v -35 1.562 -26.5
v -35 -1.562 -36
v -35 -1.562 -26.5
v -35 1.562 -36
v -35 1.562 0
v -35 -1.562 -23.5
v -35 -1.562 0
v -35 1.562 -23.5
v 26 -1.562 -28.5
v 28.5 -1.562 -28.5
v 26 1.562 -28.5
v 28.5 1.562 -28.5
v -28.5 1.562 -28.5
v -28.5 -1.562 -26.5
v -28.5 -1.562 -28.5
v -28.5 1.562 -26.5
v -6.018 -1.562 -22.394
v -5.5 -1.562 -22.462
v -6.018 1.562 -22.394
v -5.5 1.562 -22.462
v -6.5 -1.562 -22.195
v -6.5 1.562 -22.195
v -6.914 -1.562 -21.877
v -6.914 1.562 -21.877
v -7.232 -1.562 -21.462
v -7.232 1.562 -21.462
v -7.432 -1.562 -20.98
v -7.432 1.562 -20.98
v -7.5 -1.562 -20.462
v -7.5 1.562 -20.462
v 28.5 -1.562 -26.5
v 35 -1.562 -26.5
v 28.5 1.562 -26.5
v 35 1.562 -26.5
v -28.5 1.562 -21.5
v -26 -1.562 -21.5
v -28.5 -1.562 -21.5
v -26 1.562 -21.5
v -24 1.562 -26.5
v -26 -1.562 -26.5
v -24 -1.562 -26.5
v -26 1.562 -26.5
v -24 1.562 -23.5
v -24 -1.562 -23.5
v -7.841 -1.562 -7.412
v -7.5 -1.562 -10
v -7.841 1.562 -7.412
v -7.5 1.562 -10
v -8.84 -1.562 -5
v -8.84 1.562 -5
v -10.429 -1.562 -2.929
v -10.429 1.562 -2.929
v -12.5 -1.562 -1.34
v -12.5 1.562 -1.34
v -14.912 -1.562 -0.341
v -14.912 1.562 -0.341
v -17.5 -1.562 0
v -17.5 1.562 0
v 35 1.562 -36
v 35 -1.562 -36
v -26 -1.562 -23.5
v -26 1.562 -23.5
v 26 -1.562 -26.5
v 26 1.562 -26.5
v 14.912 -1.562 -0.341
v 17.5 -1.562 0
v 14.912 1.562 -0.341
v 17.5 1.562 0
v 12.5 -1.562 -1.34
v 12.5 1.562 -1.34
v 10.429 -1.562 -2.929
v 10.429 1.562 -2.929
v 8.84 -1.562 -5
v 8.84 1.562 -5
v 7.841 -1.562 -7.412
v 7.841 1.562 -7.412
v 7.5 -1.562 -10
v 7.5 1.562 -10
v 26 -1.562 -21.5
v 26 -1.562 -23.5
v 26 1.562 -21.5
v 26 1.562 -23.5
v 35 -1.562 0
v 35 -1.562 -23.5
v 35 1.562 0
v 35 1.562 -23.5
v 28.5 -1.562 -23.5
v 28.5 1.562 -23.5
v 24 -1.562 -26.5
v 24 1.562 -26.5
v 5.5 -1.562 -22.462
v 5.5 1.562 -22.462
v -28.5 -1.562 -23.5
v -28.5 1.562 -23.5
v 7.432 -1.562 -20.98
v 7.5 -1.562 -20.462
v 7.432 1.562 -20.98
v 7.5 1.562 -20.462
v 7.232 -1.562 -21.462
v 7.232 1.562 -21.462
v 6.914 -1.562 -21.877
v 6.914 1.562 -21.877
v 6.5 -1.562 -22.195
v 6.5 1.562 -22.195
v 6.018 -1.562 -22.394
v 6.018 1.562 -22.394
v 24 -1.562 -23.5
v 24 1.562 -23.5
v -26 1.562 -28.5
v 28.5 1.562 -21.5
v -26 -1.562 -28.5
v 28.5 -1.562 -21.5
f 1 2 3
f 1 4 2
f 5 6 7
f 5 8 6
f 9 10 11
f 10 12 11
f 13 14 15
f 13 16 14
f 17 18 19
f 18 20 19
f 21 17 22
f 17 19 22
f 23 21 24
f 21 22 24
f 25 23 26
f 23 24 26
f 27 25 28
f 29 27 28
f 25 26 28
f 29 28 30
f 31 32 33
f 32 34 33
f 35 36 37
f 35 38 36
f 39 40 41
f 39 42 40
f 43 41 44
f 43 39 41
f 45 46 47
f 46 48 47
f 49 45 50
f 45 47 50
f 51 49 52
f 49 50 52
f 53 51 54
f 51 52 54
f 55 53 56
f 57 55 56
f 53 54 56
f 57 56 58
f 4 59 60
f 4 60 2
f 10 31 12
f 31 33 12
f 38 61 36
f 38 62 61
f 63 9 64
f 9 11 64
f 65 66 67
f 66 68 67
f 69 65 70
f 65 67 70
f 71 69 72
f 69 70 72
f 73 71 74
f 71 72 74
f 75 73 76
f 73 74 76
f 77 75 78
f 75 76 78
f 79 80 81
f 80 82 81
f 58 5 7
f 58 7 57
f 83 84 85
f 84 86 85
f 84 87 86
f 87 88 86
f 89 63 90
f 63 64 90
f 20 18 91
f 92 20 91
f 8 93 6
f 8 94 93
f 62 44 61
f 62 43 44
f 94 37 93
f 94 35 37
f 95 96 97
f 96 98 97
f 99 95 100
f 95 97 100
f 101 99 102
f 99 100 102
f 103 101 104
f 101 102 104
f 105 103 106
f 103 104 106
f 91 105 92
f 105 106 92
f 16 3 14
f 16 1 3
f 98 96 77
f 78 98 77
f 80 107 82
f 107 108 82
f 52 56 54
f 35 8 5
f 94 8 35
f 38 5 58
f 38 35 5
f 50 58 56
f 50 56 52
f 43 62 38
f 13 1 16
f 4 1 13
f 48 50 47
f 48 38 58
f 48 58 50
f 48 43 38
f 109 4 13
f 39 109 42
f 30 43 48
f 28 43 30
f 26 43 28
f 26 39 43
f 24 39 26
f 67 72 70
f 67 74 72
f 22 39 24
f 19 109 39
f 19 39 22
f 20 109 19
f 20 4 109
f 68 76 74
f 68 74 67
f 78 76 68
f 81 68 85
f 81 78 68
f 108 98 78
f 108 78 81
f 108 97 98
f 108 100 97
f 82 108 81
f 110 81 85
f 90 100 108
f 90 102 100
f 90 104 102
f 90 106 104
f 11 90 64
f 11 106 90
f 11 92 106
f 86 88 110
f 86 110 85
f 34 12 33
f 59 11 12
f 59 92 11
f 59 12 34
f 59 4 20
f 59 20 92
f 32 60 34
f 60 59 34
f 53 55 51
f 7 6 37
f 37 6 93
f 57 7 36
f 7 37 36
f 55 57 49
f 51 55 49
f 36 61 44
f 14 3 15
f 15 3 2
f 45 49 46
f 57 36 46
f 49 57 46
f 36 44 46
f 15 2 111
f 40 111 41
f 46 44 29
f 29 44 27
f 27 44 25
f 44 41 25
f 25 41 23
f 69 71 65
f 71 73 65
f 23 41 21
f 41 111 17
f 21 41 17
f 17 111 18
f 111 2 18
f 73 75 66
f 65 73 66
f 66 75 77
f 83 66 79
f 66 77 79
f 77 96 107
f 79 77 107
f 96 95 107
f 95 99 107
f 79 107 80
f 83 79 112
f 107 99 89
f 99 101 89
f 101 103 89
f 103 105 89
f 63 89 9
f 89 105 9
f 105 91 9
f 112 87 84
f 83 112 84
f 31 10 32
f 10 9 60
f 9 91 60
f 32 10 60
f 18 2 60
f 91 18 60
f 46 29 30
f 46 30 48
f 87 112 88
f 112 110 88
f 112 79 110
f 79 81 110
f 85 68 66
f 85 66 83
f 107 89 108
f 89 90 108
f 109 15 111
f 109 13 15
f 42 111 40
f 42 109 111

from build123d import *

# Parameters (mm, degrees)
BOSS_EXTRUDE1_DEPTH = 1.5625
SKETCH2_W           = 15
SKETCH2_H           = 22.4625
CUT_EXTRUDE1_DEPTH  = 4.125
FILLET1_R           = 10
FILLET2_R           = 2


with BuildPart() as part:
    # Sketch1 → Boss-Extrude1 (new body, symmetric)
    with BuildSketch(Plane(origin=(0, 0, 0), x_dir=(1, 0, 0), z_dir=(0, 1, 0))):
        Polygon((0, 36), (35, 36), (35, 26.5), (28.5, 26.5), (28.5, 28.5), (26, 28.5), (26, 26.5), (24, 26.5), (24, 23.5), (26, 23.5), (26, 21.5), (28.5, 21.5), (28.5, 23.5), (35, 23.5), (35, 0), (0, 0), align=None)
    boss_extrude1 = extrude(amount=BOSS_EXTRUDE1_DEPTH, both=True)

    # Mirror1: Boss-Extrude1 across plane
    add(boss_extrude1.mirror(Plane(origin=(0, 0, 0), x_dir=(0, 0, 1), z_dir=(1, 0, 0))))

    # Sketch2 → Cut-Extrude1 (cut, through all)
    with BuildSketch(Plane.XZ.offset(1.5625)):
        with Locations((0, -11.23125)):
            Rectangle(SKETCH2_W, SKETCH2_H)
    extrude(amount=-CUT_EXTRUDE1_DEPTH, mode=Mode.SUBTRACT)

    # Fillet1
    fillet1_edges = [part.edges().sort_by_distance(p)[0] for p in [
        (-7.5, 0, 0),
        (7.5, 0, 0),
    ]]
    fillet(fillet1_edges, radius=FILLET1_R)

    # Fillet2
    fillet2_edges = [part.edges().sort_by_distance(p)[0] for p in [
        (-7.5, 0, -22.4625),
        (7.5, 0, -22.4625),
    ]]
    fillet(fillet2_edges, radius=FILLET2_R)


solid = part.part
